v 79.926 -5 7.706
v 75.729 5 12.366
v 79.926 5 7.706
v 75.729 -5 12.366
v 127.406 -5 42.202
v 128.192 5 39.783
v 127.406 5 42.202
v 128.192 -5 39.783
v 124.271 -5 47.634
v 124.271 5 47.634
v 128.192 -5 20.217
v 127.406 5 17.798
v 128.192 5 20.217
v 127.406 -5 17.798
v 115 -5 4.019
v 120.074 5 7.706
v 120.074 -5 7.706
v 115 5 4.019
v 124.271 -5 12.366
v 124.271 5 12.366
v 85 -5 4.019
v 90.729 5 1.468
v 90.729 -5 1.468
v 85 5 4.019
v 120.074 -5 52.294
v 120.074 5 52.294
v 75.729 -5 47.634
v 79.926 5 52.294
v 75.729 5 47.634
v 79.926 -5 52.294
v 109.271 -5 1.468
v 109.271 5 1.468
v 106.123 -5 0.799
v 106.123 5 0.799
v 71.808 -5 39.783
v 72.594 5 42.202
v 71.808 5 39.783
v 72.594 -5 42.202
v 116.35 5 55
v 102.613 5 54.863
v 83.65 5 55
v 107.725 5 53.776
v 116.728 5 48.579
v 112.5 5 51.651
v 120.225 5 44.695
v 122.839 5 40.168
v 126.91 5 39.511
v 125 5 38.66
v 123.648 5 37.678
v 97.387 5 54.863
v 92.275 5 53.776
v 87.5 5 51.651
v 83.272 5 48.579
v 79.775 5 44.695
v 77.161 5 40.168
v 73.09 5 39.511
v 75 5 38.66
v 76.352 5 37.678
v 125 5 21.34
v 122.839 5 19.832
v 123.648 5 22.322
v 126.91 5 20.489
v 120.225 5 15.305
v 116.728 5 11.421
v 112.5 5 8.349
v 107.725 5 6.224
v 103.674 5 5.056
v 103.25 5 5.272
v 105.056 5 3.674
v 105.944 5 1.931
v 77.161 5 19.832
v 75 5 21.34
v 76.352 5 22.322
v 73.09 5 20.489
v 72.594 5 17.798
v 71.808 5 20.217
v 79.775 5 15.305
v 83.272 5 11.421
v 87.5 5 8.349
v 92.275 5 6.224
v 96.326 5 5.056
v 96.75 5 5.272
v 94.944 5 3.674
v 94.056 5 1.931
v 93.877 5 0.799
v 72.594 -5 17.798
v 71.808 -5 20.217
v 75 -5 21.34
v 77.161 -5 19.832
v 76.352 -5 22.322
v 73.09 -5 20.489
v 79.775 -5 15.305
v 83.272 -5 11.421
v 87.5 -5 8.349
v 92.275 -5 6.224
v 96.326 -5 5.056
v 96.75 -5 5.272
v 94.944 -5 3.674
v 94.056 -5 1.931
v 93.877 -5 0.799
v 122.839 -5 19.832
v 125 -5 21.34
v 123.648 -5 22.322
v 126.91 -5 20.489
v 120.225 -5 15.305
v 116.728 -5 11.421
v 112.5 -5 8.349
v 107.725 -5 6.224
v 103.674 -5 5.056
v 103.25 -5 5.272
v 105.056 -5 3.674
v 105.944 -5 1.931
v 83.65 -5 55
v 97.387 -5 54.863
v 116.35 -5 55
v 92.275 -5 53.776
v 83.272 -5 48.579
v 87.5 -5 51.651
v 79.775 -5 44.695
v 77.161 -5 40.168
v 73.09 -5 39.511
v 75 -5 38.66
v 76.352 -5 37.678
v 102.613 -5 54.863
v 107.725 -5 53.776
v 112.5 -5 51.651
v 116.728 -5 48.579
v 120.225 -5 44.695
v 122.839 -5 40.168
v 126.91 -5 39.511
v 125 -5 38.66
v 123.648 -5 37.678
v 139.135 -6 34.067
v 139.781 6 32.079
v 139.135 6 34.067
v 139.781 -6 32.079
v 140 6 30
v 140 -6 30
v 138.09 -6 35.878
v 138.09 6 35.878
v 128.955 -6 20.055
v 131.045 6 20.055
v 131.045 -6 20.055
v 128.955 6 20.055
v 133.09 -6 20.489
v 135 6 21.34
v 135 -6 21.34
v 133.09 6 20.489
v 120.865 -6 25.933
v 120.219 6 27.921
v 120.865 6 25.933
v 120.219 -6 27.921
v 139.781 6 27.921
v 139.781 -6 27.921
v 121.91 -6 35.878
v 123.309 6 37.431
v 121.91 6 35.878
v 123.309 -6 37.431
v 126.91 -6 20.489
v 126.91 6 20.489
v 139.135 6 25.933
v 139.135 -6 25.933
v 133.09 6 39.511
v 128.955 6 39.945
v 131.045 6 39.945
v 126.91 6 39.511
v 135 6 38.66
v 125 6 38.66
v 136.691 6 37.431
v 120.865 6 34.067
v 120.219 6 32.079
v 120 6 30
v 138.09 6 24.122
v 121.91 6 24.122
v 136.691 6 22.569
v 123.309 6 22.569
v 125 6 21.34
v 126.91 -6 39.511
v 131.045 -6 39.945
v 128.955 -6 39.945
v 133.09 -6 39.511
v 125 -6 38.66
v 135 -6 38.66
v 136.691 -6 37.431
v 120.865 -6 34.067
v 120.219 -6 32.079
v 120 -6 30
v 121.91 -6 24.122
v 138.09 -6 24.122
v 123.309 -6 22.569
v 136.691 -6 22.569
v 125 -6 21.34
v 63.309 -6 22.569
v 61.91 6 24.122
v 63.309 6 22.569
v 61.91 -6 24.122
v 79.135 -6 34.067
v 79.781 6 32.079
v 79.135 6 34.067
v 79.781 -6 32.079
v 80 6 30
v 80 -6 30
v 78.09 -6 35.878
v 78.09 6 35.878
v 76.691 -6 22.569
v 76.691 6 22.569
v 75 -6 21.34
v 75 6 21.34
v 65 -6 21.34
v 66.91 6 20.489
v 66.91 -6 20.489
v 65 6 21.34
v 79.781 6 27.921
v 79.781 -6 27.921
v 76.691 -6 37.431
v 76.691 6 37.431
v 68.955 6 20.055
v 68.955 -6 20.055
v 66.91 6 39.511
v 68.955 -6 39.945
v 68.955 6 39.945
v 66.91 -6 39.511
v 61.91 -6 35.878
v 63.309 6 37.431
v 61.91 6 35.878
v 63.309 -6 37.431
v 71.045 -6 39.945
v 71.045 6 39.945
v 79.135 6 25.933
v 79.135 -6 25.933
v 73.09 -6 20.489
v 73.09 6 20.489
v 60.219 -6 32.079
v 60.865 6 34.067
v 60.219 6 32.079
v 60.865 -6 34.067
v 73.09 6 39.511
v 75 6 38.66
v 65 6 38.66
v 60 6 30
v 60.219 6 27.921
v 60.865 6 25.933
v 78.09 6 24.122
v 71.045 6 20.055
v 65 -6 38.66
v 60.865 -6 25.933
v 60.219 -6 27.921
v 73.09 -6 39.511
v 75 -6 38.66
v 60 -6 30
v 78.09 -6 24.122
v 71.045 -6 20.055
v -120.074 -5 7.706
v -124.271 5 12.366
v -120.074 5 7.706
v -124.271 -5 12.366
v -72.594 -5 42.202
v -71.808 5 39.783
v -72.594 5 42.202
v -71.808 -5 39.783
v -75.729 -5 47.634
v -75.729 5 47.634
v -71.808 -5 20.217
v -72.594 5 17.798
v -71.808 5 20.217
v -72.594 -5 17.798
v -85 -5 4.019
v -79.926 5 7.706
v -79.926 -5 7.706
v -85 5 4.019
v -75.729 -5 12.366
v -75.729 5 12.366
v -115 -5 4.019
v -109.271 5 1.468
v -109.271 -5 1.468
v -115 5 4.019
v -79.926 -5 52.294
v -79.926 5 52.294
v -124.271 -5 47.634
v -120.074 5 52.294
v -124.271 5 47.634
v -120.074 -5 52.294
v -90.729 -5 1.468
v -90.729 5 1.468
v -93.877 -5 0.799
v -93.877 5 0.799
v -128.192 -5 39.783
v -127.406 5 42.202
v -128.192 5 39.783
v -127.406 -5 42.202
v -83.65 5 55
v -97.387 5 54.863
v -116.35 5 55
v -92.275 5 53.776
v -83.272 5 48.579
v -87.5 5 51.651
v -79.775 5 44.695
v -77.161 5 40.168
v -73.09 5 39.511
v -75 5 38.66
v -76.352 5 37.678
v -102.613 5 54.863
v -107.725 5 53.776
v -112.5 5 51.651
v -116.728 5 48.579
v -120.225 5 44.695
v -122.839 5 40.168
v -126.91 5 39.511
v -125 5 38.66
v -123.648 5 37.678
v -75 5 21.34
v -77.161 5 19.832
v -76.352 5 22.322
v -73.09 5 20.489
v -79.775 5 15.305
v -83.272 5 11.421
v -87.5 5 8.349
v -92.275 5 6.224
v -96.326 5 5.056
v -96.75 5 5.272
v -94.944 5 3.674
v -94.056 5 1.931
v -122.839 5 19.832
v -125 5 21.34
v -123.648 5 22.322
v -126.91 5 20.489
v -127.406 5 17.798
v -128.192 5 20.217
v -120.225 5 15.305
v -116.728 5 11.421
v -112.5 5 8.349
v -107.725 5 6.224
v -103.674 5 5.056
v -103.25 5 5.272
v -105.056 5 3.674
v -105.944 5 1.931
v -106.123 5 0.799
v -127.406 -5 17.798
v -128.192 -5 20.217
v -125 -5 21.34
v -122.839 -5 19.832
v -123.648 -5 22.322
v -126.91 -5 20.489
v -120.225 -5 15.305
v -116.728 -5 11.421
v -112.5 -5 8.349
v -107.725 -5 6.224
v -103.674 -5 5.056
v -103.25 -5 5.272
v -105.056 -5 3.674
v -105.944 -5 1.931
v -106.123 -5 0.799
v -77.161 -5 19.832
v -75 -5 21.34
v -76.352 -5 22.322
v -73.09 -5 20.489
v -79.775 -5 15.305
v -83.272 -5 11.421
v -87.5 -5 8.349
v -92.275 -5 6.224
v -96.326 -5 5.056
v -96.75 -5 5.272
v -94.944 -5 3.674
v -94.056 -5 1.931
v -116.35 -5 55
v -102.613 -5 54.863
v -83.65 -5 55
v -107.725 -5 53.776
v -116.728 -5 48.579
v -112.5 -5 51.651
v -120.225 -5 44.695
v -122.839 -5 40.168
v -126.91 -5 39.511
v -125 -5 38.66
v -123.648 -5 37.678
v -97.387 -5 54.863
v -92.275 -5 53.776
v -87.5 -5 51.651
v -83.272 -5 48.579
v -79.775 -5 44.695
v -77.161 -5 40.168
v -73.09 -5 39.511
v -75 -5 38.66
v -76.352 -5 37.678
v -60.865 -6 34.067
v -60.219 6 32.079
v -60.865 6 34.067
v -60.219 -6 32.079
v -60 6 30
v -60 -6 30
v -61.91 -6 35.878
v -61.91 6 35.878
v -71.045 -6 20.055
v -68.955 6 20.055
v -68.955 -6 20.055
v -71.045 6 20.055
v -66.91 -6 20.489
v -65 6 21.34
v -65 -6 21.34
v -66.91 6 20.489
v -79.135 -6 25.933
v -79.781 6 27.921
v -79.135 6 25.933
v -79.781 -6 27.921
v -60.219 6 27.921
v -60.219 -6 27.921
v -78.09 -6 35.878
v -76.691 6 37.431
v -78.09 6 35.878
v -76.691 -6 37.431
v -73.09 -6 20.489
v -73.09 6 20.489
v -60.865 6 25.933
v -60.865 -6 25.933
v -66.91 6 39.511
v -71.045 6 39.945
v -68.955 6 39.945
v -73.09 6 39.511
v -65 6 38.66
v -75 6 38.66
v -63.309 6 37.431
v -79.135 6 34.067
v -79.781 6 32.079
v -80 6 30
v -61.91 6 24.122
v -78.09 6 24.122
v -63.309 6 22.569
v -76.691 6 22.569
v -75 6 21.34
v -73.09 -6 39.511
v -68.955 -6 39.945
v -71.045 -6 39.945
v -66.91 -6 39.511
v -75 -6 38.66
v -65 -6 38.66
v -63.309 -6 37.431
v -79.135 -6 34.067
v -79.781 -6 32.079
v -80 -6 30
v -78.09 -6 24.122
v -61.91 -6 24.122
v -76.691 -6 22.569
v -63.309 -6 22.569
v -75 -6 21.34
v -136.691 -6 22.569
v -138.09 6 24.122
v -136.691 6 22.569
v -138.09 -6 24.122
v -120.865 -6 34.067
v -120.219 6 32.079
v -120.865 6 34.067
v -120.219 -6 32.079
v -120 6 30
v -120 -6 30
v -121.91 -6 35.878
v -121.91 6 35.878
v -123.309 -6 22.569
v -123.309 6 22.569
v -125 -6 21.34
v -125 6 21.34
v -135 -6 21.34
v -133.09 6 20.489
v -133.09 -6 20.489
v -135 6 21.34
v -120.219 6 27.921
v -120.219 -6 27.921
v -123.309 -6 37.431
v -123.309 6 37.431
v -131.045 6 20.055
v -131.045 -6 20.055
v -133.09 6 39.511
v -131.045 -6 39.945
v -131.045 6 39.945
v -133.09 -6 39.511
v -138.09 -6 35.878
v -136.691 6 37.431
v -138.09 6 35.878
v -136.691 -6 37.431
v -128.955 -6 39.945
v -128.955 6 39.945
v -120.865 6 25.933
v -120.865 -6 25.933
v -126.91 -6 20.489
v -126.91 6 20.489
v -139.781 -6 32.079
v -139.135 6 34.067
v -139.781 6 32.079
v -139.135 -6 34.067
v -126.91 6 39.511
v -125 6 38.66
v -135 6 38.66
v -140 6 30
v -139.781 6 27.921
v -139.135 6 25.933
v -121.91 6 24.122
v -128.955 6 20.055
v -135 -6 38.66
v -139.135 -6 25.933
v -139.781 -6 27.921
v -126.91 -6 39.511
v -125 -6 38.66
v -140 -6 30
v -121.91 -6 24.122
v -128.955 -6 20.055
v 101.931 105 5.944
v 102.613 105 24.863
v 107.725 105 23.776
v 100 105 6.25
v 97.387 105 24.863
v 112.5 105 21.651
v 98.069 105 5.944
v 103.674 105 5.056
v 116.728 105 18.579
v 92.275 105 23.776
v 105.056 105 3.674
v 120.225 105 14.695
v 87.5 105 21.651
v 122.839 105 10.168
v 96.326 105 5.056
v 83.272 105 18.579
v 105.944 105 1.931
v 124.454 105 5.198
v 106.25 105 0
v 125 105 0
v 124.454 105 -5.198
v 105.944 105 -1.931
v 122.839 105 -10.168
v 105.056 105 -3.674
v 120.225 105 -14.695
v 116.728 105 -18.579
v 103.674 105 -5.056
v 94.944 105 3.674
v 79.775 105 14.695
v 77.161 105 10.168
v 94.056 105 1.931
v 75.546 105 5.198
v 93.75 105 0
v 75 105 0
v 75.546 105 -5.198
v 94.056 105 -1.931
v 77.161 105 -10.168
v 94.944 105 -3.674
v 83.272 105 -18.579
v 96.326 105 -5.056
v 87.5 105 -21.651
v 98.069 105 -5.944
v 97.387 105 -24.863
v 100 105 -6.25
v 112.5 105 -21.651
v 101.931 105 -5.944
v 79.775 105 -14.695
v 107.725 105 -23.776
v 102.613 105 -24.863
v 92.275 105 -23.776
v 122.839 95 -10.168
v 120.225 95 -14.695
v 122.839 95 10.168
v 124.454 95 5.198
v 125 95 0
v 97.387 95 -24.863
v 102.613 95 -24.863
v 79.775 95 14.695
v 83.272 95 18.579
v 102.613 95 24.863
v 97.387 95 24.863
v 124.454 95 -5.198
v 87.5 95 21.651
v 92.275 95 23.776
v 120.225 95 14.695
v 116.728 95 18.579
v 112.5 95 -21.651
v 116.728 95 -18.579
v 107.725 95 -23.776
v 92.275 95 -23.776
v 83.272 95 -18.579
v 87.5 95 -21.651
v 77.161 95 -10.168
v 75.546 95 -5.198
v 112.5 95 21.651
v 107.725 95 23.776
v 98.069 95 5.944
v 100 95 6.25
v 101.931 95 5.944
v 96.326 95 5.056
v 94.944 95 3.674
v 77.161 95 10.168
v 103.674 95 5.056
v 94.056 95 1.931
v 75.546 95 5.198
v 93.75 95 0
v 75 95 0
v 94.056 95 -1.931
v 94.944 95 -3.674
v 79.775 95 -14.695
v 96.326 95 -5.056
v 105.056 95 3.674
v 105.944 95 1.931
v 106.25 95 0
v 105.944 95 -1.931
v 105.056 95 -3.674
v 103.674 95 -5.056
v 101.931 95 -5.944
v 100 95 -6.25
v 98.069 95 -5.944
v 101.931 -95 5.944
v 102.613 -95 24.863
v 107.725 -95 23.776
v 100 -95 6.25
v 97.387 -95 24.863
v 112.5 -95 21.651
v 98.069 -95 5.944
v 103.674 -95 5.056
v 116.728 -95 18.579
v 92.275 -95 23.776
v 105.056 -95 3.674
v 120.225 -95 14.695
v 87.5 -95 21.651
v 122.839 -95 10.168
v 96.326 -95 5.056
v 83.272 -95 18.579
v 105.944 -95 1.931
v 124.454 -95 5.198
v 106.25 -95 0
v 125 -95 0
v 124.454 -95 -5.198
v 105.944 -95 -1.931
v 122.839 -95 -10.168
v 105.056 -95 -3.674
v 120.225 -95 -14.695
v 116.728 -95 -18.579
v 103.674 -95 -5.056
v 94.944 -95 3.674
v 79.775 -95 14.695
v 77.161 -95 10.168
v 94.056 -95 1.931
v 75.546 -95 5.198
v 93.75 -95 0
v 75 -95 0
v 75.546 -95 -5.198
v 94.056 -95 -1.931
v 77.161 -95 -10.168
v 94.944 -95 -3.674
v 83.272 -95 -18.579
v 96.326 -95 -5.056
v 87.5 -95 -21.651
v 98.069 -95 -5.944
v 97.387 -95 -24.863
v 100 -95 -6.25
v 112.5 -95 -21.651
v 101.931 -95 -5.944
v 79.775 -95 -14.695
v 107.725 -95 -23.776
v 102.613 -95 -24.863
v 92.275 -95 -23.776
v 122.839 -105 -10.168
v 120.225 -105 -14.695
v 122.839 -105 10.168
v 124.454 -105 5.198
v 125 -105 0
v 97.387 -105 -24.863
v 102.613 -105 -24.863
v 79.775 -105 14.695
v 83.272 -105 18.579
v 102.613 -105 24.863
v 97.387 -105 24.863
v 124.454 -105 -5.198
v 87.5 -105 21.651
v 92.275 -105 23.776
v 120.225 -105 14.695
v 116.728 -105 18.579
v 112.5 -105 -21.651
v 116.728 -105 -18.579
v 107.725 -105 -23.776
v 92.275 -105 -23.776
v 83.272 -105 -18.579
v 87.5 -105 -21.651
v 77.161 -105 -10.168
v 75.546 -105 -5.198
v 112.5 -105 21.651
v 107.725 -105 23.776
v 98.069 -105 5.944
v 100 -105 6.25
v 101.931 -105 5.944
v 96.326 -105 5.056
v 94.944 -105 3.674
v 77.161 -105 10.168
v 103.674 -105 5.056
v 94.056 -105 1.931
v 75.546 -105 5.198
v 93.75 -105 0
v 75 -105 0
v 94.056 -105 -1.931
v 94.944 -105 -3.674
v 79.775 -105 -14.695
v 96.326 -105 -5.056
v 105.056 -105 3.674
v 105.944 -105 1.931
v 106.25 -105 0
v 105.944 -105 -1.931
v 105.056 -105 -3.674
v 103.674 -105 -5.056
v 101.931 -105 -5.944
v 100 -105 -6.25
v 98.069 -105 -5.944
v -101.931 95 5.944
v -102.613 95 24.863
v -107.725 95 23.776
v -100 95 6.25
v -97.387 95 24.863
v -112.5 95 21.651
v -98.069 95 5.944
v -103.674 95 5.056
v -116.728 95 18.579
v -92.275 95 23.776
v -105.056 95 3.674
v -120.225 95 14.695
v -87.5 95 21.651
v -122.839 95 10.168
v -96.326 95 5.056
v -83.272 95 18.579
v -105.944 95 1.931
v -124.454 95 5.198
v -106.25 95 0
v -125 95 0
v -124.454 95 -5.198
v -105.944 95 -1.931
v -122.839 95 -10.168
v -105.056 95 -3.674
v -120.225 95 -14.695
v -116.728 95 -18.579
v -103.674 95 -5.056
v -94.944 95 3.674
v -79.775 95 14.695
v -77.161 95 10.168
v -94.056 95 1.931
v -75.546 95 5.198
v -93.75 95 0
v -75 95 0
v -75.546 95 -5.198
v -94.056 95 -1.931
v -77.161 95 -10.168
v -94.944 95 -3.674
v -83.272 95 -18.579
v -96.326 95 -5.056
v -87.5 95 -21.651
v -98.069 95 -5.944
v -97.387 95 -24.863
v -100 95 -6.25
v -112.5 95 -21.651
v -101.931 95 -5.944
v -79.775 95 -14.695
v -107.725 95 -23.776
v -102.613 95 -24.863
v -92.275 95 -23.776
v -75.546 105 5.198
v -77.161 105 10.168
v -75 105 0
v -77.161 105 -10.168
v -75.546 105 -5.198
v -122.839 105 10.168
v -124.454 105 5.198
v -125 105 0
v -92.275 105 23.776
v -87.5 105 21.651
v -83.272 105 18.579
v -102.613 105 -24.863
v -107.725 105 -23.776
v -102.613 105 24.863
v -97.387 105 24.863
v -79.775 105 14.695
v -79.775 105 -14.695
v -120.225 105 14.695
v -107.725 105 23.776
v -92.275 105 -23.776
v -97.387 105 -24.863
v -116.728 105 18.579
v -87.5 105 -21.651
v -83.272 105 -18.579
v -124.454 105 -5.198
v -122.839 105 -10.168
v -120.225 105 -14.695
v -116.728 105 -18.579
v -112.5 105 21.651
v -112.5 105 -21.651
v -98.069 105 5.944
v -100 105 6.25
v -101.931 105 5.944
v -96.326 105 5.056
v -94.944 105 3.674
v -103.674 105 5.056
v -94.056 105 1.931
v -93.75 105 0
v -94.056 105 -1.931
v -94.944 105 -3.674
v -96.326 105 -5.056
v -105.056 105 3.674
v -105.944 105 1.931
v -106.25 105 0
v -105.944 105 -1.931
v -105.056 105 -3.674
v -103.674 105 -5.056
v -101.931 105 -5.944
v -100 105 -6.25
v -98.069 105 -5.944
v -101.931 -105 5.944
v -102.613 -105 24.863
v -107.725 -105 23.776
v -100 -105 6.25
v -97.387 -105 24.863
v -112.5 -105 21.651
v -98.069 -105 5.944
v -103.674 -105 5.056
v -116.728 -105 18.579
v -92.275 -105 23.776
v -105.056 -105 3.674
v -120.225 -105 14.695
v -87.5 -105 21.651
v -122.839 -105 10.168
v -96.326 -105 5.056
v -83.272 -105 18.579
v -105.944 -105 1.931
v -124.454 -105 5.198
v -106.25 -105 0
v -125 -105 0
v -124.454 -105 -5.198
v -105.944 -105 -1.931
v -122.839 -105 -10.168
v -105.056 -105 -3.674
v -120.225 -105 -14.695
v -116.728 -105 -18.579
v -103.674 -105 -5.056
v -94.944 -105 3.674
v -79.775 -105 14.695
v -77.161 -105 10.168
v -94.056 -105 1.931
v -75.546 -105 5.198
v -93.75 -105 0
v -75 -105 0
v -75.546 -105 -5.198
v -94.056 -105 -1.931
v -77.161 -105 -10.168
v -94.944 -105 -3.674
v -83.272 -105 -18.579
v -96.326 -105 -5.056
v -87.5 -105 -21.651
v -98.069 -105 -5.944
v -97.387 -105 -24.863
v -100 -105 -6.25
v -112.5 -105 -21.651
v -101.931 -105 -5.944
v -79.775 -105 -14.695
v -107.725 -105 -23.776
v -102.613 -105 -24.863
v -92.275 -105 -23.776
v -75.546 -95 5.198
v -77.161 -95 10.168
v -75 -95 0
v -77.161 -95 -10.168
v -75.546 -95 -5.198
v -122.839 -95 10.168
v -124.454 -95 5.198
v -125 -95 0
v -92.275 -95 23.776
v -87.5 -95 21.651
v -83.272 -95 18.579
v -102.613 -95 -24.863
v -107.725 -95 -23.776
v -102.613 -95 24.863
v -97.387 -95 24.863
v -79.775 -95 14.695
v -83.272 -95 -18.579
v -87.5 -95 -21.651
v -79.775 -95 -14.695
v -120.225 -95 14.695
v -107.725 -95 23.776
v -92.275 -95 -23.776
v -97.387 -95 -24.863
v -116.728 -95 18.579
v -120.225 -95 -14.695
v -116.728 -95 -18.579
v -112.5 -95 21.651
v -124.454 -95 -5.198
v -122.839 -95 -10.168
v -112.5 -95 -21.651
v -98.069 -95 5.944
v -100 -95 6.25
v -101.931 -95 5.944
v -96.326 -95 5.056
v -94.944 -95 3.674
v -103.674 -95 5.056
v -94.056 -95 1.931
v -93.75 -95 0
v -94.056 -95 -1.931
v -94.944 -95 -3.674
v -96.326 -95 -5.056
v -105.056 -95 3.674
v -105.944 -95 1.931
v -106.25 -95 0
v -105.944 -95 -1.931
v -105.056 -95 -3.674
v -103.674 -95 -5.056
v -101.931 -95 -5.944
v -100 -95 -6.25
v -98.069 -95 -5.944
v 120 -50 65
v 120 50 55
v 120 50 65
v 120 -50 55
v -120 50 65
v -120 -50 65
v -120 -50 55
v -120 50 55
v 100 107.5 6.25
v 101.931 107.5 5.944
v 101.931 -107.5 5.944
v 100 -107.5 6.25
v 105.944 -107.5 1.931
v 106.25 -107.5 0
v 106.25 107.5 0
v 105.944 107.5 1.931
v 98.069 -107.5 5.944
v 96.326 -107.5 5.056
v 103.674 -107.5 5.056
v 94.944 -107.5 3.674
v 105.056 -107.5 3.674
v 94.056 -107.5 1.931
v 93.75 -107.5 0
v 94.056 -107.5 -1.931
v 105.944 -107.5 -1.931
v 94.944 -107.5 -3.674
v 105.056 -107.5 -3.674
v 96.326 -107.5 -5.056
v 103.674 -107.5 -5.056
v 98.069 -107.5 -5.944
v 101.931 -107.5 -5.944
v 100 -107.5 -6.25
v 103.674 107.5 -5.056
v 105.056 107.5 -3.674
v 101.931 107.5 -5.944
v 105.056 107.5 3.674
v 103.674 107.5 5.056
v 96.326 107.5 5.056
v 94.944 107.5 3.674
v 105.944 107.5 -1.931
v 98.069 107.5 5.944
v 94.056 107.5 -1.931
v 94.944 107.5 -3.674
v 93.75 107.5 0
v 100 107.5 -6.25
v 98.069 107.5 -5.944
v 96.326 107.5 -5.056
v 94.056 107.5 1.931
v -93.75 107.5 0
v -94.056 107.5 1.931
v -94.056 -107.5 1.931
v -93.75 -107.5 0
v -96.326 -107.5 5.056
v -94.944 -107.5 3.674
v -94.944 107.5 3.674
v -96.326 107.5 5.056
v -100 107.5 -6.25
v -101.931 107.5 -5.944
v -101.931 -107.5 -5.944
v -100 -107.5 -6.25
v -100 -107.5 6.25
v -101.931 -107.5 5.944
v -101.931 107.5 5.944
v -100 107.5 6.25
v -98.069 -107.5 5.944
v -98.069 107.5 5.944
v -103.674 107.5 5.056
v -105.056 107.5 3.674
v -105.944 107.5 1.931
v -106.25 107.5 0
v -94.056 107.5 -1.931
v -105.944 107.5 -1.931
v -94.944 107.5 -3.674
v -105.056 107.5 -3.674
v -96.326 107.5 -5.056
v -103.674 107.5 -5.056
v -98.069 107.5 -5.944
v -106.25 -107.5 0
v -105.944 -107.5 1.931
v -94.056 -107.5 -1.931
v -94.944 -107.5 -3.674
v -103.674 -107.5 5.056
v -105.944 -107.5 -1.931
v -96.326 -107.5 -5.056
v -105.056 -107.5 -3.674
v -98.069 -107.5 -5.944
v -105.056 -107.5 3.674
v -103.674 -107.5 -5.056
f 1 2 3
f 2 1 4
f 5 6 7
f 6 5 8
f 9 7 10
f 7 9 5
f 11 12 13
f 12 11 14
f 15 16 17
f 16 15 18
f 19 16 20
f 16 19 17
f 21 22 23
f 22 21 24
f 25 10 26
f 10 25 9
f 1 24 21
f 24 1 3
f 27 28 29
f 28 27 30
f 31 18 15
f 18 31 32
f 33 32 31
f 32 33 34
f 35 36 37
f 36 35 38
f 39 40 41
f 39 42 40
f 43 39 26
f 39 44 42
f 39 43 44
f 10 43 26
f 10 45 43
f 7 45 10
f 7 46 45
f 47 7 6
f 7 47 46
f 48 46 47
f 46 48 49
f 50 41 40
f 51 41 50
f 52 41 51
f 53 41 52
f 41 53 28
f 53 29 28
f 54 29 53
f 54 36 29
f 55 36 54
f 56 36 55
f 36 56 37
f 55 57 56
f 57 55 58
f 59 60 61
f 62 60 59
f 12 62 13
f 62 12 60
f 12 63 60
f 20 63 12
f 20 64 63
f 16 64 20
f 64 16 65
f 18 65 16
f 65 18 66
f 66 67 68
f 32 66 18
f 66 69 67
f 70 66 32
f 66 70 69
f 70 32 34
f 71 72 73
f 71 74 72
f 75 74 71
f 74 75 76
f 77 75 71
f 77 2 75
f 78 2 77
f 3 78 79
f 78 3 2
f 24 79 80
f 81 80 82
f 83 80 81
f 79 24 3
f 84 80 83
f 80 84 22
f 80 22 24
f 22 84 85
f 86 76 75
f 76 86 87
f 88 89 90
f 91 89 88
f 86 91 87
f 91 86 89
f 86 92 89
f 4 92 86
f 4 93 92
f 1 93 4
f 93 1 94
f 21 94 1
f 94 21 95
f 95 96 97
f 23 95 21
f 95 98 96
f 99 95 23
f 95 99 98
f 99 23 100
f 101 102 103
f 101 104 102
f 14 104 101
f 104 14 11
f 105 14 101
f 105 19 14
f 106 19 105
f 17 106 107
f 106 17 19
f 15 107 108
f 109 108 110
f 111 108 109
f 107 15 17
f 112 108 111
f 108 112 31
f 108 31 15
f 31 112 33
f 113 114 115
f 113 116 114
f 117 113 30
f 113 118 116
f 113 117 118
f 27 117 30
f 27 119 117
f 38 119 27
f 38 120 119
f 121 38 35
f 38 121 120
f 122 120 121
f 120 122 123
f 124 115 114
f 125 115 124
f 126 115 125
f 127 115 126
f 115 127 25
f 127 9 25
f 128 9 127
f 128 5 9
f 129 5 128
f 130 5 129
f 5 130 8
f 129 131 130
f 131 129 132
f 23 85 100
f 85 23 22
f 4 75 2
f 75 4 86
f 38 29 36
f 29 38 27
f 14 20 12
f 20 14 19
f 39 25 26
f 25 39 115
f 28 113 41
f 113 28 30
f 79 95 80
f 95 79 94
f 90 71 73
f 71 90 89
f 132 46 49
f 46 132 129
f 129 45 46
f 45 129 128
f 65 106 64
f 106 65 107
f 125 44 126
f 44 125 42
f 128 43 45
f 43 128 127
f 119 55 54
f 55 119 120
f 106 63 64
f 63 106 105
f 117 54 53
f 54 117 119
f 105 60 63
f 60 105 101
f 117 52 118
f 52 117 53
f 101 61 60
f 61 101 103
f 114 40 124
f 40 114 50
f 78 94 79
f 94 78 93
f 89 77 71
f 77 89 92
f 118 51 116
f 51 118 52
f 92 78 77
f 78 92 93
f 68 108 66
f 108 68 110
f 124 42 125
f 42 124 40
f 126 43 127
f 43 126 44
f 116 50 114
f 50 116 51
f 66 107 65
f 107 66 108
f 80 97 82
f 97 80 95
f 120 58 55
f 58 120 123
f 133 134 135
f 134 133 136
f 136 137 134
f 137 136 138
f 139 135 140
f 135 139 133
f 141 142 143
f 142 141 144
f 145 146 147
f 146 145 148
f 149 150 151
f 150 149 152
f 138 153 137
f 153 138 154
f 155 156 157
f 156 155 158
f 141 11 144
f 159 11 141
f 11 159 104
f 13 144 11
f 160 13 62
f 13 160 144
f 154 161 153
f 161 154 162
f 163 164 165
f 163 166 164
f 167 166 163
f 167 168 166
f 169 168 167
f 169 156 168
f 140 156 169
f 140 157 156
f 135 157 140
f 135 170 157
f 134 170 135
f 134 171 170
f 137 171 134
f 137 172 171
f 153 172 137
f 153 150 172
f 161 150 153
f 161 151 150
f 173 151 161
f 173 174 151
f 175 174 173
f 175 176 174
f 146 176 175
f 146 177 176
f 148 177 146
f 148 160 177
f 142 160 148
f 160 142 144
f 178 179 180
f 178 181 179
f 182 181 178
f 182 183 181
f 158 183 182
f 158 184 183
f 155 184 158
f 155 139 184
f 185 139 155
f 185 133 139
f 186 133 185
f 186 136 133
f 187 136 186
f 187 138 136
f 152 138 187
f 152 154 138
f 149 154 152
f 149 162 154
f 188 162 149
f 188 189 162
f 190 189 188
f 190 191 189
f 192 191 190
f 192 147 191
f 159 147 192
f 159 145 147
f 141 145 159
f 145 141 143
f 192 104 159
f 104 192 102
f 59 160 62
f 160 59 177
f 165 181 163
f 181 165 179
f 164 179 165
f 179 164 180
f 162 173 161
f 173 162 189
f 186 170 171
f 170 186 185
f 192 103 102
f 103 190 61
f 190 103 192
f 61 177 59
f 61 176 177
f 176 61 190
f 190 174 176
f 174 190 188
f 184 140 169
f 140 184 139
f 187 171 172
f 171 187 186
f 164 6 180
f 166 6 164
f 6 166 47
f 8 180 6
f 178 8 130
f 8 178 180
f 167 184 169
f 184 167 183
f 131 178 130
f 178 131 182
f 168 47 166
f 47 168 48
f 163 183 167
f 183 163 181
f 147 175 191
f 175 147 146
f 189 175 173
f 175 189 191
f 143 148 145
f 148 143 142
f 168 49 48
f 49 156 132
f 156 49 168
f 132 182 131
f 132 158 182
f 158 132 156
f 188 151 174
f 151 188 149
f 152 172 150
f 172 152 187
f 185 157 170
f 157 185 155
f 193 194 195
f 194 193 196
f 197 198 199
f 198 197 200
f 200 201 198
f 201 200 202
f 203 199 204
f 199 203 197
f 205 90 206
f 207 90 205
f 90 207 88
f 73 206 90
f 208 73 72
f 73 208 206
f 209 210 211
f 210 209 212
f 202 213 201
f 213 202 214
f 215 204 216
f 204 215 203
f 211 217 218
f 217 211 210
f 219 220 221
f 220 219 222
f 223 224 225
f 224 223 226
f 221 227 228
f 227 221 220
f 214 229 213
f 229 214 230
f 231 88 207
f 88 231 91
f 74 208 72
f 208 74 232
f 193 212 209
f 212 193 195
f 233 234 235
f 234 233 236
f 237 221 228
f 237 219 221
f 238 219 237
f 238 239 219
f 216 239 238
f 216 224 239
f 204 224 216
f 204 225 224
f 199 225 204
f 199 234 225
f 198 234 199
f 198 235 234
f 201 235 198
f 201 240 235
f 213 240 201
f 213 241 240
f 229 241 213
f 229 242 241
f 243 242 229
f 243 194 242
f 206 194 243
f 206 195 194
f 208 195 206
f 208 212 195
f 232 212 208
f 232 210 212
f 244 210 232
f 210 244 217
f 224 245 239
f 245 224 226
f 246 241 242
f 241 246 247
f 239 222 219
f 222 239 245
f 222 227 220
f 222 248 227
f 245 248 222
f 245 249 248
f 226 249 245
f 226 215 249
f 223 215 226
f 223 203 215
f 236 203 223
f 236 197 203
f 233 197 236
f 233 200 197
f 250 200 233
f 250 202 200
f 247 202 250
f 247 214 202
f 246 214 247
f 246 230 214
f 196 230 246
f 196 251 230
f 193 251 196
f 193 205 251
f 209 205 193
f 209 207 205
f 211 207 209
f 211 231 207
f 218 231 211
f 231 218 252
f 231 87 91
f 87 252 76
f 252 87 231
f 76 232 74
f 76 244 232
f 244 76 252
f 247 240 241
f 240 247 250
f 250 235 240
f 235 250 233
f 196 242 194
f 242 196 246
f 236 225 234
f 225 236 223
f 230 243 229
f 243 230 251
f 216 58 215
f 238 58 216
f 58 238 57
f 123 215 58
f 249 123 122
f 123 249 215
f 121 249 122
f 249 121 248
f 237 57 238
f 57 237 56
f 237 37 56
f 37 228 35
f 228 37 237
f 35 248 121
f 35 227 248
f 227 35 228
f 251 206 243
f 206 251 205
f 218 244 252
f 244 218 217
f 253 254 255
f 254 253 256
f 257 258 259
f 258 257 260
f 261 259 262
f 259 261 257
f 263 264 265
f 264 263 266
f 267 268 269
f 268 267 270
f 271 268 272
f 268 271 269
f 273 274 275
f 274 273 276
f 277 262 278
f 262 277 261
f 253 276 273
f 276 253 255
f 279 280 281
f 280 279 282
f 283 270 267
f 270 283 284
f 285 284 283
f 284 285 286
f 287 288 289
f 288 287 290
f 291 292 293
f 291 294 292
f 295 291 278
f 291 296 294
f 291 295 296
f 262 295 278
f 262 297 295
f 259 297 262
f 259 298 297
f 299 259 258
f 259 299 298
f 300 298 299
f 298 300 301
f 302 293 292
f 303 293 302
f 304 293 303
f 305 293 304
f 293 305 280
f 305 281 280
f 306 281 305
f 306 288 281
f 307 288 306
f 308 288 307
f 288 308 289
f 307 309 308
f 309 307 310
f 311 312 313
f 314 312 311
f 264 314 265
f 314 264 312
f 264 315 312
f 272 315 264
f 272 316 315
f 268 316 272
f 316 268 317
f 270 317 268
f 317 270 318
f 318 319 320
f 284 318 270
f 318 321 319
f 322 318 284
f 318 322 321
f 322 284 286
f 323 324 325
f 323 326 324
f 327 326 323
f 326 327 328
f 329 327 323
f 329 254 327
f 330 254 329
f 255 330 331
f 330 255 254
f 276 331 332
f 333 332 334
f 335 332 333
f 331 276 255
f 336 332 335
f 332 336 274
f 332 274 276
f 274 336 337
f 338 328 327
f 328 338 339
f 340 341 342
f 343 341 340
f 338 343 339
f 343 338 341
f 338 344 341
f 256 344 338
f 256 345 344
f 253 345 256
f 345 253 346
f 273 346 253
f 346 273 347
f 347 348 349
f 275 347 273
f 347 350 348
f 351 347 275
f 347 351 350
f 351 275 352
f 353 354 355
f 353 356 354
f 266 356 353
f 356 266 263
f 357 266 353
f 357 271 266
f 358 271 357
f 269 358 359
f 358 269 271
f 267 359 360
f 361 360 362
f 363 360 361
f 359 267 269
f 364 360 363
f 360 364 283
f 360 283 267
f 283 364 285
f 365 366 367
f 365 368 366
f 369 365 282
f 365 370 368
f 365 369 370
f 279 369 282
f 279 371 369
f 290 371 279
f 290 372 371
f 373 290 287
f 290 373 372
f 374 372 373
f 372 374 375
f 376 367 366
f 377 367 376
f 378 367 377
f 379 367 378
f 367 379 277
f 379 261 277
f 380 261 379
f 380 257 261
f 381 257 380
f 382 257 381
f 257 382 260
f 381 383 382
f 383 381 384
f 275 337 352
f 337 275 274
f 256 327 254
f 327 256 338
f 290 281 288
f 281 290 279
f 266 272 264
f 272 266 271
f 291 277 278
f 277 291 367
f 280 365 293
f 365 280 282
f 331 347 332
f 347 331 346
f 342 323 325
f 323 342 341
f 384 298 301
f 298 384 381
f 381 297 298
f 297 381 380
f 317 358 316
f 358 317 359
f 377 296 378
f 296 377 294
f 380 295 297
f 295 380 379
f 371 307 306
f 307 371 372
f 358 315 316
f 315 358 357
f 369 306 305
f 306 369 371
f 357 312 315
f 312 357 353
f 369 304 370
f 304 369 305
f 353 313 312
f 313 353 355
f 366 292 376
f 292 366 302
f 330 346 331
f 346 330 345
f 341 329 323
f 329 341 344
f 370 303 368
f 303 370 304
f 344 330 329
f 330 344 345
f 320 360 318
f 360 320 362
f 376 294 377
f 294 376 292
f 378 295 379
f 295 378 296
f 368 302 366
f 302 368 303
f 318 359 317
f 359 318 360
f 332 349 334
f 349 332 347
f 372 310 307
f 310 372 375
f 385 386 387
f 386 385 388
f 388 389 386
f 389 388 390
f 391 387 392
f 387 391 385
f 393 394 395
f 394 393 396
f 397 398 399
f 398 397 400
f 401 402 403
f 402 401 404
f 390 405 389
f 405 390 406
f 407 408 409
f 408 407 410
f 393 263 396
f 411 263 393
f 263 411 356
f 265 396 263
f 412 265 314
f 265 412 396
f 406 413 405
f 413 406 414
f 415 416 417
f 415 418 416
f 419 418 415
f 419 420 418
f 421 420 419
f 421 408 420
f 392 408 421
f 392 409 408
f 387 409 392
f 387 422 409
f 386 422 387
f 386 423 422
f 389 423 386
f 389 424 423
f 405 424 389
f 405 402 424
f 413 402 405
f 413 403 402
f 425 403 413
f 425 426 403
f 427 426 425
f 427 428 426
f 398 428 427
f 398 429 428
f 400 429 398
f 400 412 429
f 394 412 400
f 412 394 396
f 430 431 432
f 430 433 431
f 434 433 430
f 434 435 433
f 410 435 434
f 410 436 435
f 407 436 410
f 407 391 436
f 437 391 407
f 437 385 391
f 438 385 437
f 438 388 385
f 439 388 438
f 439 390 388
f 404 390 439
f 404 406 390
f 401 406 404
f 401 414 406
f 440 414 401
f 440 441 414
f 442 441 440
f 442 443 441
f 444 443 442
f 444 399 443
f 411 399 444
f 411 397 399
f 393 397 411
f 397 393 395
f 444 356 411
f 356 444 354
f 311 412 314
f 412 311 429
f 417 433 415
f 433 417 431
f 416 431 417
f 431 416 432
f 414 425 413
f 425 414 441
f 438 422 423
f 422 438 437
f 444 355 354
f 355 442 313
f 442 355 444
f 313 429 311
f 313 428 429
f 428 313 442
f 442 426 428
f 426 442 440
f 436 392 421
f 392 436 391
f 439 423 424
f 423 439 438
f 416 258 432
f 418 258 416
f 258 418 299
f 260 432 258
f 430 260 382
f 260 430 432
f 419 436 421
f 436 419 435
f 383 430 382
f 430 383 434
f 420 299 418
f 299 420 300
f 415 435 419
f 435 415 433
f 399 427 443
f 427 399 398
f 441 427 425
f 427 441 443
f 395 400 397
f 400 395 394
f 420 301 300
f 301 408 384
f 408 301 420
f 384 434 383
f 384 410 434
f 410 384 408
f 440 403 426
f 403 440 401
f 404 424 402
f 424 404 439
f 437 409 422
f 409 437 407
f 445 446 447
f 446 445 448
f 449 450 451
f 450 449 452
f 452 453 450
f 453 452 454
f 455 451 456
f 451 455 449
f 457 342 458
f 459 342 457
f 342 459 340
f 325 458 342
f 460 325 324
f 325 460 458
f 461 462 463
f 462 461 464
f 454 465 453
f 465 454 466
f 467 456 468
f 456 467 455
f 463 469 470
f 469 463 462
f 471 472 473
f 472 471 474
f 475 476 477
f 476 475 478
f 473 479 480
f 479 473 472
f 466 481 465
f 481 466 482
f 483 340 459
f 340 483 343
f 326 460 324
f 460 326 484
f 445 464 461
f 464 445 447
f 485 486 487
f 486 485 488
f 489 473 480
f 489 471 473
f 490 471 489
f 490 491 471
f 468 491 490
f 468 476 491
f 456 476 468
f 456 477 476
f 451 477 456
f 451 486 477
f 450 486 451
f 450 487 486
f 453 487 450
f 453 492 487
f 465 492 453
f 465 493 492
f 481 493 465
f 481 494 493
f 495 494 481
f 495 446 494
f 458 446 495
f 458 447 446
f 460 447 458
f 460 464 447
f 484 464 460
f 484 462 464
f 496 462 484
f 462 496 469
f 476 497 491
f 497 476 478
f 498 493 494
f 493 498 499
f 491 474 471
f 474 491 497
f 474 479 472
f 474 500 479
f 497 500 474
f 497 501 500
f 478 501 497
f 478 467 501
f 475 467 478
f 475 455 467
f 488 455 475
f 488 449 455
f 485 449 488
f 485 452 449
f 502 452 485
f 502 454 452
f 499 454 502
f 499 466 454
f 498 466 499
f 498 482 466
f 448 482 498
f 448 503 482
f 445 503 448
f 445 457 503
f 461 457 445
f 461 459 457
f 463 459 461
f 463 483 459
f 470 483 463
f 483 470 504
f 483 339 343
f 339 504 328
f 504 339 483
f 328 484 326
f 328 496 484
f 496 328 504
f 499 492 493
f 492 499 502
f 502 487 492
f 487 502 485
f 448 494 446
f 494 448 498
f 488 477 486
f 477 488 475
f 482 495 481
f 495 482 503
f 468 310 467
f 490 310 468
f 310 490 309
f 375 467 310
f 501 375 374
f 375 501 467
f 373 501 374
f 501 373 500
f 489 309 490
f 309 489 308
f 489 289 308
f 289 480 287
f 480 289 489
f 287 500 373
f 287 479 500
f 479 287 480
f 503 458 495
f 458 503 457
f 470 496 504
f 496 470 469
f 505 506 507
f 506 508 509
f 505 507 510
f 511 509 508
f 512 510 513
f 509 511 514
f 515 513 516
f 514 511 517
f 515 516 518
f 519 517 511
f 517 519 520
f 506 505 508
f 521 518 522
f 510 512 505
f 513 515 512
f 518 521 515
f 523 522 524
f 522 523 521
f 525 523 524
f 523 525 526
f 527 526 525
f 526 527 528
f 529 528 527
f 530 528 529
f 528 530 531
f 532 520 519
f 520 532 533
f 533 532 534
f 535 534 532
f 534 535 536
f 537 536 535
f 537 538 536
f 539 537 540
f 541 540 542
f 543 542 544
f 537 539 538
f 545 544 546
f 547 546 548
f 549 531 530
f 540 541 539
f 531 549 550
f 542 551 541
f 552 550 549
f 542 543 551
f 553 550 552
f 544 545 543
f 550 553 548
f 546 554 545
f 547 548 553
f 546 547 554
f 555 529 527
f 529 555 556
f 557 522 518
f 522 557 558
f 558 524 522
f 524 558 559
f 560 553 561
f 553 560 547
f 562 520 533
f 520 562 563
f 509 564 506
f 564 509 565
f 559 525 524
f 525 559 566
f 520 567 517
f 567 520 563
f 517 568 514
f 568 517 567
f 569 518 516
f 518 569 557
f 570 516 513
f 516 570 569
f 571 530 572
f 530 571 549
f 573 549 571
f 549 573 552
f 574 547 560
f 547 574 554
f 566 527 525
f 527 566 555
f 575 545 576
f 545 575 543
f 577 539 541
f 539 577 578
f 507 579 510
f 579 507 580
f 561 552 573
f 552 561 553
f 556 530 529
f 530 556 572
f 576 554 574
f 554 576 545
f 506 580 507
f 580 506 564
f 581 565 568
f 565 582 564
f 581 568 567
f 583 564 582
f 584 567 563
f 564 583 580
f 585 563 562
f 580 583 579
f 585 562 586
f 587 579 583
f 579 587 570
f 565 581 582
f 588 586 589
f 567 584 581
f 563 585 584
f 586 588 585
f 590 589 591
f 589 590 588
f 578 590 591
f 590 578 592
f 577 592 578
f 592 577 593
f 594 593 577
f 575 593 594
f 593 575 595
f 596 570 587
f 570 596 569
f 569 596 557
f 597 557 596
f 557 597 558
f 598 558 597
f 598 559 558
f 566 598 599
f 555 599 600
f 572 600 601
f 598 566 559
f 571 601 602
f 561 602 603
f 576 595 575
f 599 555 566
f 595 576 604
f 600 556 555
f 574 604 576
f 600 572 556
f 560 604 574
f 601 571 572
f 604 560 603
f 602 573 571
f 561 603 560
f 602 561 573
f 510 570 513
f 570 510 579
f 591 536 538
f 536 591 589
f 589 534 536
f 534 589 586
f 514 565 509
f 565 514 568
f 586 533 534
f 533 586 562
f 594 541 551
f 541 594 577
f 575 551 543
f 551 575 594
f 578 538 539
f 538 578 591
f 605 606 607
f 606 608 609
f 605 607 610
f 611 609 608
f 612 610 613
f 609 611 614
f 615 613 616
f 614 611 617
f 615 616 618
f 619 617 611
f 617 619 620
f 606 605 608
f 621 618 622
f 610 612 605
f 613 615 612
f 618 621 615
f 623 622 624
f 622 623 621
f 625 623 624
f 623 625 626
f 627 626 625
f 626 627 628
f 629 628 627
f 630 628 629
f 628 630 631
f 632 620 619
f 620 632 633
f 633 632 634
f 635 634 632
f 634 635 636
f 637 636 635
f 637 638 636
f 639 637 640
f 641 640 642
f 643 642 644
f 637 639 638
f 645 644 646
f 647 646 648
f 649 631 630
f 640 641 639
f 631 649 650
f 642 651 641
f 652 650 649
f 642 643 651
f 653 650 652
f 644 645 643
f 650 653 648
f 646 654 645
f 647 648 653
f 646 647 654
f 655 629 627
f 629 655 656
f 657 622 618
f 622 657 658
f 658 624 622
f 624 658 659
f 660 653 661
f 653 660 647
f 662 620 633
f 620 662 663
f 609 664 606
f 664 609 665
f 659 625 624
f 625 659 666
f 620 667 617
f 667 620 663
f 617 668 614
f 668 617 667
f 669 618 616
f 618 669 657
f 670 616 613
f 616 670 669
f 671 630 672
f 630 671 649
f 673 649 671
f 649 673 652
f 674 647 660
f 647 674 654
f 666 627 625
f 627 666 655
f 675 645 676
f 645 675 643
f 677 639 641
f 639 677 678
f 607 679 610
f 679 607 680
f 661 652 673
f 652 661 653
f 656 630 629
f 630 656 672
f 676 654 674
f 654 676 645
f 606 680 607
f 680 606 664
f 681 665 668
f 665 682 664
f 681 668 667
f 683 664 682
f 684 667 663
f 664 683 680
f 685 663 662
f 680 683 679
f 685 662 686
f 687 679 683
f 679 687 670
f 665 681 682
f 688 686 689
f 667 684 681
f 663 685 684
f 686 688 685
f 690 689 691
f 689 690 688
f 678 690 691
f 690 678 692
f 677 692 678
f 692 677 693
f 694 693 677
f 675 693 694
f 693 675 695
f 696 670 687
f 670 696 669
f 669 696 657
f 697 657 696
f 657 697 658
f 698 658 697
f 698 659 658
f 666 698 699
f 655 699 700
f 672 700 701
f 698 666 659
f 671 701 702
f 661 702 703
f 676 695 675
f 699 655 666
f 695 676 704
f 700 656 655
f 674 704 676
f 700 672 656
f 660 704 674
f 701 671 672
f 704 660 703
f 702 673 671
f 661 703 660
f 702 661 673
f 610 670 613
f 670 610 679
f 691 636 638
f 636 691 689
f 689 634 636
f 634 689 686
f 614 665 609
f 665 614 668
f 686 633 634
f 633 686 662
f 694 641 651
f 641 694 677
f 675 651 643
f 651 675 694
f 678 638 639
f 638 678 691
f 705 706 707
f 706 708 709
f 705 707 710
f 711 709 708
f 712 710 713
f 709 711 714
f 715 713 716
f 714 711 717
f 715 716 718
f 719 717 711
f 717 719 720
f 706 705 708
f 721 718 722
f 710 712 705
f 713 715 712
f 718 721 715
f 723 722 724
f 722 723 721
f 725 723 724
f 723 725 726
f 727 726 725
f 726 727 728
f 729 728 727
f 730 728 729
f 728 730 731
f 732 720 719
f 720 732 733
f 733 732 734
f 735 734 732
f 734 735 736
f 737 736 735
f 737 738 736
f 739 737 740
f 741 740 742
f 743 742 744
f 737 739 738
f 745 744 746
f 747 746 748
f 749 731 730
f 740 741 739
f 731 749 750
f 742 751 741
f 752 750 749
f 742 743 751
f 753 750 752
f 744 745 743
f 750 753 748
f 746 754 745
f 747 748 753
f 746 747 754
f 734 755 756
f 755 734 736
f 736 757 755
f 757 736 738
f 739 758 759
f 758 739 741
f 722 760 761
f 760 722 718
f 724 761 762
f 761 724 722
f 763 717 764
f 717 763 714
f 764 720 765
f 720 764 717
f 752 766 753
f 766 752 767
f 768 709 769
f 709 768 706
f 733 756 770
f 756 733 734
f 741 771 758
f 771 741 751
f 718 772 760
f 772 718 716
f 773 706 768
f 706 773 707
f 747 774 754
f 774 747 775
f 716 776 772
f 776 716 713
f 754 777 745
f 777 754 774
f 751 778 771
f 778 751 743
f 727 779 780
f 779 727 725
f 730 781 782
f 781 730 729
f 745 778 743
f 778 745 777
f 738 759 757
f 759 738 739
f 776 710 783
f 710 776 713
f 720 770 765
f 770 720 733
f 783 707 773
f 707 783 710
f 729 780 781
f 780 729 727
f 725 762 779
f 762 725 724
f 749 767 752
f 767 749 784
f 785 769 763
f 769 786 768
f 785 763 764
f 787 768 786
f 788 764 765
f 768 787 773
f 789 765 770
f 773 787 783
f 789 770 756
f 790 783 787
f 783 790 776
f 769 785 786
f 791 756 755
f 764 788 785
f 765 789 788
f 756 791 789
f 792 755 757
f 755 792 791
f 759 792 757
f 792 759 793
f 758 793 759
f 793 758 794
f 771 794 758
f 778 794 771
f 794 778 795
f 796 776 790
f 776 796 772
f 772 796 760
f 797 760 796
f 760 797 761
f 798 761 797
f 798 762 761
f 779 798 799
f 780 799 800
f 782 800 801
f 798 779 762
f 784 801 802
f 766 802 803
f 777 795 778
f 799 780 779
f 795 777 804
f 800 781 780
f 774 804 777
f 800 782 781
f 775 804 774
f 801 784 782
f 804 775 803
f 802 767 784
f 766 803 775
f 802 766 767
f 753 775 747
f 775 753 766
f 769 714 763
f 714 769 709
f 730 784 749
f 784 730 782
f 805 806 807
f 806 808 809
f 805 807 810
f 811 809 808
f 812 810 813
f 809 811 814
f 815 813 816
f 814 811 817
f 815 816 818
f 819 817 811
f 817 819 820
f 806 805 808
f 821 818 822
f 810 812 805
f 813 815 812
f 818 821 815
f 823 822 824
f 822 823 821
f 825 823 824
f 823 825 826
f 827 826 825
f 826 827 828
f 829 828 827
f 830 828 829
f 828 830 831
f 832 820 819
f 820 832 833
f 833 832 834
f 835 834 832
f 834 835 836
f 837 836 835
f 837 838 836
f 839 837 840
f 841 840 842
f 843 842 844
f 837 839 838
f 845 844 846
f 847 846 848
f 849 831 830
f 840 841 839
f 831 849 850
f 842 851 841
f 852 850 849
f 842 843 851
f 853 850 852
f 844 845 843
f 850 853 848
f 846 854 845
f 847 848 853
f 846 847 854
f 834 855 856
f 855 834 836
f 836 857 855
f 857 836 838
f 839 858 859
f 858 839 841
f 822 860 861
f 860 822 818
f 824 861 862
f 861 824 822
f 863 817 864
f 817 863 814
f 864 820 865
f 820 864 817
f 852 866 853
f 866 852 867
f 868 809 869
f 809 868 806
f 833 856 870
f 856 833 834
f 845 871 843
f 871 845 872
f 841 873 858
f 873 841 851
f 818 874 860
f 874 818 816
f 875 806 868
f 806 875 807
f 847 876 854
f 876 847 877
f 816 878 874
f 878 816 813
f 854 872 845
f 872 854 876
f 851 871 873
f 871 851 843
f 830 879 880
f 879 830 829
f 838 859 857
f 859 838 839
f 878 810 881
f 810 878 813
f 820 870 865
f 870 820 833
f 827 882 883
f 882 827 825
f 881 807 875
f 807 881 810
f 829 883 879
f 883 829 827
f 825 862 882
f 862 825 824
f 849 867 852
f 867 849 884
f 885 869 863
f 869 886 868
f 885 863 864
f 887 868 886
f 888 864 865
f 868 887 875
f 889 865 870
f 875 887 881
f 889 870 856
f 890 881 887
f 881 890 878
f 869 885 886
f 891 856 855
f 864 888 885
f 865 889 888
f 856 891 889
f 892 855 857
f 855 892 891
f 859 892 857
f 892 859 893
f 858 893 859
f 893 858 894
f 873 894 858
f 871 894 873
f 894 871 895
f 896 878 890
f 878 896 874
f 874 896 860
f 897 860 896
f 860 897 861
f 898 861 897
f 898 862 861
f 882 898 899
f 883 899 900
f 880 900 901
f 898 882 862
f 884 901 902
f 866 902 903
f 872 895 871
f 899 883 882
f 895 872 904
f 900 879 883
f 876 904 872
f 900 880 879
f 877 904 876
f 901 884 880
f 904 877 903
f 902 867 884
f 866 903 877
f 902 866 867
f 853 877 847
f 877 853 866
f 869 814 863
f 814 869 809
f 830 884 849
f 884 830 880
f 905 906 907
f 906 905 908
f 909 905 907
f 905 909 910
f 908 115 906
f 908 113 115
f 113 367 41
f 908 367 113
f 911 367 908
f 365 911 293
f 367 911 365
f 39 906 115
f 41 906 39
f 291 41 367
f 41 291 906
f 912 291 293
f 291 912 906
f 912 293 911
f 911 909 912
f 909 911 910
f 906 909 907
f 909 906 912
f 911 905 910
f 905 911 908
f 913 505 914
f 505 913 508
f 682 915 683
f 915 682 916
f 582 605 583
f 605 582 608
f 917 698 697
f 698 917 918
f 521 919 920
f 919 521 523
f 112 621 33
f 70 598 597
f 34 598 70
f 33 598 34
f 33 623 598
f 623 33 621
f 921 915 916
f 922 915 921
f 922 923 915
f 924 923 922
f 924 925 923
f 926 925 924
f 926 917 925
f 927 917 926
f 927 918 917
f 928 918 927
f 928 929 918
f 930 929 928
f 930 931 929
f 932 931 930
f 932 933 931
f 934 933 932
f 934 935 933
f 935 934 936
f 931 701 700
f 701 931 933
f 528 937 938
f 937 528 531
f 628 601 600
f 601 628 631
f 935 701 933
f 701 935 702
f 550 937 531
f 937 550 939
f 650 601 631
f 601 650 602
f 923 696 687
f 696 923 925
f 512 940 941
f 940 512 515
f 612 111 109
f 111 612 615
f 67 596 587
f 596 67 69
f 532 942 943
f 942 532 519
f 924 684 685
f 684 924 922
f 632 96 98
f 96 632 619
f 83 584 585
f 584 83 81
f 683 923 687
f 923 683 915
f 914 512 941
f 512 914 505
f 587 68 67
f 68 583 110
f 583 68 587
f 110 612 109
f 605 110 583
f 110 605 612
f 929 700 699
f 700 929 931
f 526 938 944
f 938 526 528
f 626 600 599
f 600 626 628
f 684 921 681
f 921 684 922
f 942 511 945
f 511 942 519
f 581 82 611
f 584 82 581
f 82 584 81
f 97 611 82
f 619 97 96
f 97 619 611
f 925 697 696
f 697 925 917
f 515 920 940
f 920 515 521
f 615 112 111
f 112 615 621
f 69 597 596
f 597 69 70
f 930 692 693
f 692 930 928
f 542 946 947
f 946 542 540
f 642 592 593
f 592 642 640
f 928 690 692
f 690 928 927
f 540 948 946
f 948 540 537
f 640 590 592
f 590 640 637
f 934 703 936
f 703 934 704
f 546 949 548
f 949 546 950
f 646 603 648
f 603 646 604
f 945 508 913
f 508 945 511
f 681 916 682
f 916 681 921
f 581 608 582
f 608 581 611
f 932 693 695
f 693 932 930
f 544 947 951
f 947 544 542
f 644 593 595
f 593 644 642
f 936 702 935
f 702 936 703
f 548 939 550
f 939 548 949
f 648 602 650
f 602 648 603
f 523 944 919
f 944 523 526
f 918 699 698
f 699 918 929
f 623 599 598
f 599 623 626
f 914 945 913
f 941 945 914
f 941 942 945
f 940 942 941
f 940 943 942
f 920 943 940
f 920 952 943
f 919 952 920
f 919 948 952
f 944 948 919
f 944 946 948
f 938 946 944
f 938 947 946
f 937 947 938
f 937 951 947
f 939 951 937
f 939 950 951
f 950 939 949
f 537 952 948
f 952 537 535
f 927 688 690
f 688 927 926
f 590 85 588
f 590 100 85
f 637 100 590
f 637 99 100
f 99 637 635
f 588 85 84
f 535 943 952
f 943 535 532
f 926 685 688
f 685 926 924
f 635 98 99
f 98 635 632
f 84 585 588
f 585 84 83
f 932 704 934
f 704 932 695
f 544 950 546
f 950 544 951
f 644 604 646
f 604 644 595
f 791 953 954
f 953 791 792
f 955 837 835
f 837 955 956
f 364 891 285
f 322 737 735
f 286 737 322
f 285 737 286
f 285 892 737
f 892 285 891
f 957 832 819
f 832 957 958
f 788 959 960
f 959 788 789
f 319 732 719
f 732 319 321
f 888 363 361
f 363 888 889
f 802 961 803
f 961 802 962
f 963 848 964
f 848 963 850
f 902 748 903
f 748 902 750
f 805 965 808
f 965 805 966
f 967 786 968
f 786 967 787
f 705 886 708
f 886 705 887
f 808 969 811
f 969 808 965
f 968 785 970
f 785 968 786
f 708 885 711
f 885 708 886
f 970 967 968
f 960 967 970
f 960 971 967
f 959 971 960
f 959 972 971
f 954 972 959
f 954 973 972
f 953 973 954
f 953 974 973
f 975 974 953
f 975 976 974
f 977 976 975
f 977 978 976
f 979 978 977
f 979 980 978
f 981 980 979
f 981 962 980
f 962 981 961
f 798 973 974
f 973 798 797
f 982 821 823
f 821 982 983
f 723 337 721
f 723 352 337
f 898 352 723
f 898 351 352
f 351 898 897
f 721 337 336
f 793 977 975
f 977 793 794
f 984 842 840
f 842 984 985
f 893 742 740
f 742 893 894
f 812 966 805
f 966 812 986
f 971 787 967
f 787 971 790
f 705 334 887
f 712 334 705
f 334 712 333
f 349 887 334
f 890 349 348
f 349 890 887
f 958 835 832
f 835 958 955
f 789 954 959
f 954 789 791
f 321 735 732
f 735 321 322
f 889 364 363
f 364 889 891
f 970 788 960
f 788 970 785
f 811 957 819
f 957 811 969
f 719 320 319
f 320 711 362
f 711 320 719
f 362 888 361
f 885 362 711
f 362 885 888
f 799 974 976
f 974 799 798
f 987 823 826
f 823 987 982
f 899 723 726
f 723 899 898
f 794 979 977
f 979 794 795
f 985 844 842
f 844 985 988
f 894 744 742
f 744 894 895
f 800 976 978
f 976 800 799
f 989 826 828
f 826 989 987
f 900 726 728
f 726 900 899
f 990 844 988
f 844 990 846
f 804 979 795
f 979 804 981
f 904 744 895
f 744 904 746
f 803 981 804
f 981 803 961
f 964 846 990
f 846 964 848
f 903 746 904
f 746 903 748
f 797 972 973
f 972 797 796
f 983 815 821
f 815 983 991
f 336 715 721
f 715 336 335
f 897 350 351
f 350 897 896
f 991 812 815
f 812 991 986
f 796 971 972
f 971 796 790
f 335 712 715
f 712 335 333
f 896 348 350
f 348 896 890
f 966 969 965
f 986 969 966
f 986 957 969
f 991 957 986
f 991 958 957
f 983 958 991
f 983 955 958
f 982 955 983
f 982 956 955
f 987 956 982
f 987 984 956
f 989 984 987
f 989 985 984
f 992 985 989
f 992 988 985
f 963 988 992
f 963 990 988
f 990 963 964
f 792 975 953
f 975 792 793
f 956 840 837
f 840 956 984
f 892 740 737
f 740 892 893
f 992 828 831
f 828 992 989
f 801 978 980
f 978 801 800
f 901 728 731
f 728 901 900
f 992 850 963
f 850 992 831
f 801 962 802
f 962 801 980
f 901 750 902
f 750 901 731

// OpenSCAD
wheelbase = 200;
cartlength = wheelbase * 1.2;
cartwidth = 100;
wheeldiameter = 25;
wheelradius = wheeldiameter;
// suspensionheight = (wheeldiameter / 2) + 5;
suspensionheight = (wheelradius) + 5;

translate([wheelbase / 2, cartwidth, 0]) {
    rotate([90, 0, 0]) {
        cylinder(r = wheelradius, 10, center = true);
    }
}

translate([wheelbase / 2, - (cartwidth), 0]) {
    rotate([90, 0, 0]) {
        cylinder(r = wheelradius, 10, center = true);
    }
}

translate([-wheelbase / 2, cartwidth, 0]) {
    rotate([90, 0, 0]) {
        cylinder(r = wheelradius, 10, center = true);
    }
}

translate([-wheelbase / 2, - (cartwidth), 0]) {
    rotate([90, 0, 0]) {
        cylinder(r = wheelradius, 10, center = true);
    }
}

translate([0, 0, suspensionheight * 2]) {
    cube([cartlength, cartwidth, 10], center = true);
}

translate([wheelbase / 2, 0, 0]) {
    rotate([90, 0, 0]) {
        cylinder(r = wheelradius * 0.25, h = (cartwidth * 2) + 15, center= true);
    }
}

translate([-wheelbase / 2, 0, 0]) {
    rotate([90, 0, 0]) {
        cylinder(r = wheelradius * 0.25, h = (cartwidth * 2) + 15, center= true);
    }
}

translate([wheelbase / 2, 0, suspensionheight]) {
    rotate([90, 0, 0]) {
        difference() {
            cylinder(r = suspensionheight, 10, center = true);
            cylinder(r = suspensionheight - 5, 11, center = true);
            cube([102, suspensionheight / 6, 12]);
        }
        
        translate([suspensionheight, 0, 0]) {
            cylinder(r = suspensionheight / 3, h = 12, center = true);
        }
        
        translate([-suspensionheight, 0, 0]) {
            cylinder(r = suspensionheight / 3, h = 12, center = true);
        }
    }
}

translate([-wheelbase / 2, 0, suspensionheight]) {
    rotate([90, 0, 0]) {
        difference() {
            cylinder(r = suspensionheight, 10, center = true);
            cylinder(r = suspensionheight - 5, 11, center = true);
            cube([102, suspensionheight / 6, 12]);
        }
        
        translate([suspensionheight, 0, 0]) {
            cylinder(r = suspensionheight / 3, h = 12, center = true);
        }
        
        translate([-suspensionheight, 0, 0]) {
            cylinder(r = suspensionheight / 3, h = 12, center = true);
        }
    }
}
